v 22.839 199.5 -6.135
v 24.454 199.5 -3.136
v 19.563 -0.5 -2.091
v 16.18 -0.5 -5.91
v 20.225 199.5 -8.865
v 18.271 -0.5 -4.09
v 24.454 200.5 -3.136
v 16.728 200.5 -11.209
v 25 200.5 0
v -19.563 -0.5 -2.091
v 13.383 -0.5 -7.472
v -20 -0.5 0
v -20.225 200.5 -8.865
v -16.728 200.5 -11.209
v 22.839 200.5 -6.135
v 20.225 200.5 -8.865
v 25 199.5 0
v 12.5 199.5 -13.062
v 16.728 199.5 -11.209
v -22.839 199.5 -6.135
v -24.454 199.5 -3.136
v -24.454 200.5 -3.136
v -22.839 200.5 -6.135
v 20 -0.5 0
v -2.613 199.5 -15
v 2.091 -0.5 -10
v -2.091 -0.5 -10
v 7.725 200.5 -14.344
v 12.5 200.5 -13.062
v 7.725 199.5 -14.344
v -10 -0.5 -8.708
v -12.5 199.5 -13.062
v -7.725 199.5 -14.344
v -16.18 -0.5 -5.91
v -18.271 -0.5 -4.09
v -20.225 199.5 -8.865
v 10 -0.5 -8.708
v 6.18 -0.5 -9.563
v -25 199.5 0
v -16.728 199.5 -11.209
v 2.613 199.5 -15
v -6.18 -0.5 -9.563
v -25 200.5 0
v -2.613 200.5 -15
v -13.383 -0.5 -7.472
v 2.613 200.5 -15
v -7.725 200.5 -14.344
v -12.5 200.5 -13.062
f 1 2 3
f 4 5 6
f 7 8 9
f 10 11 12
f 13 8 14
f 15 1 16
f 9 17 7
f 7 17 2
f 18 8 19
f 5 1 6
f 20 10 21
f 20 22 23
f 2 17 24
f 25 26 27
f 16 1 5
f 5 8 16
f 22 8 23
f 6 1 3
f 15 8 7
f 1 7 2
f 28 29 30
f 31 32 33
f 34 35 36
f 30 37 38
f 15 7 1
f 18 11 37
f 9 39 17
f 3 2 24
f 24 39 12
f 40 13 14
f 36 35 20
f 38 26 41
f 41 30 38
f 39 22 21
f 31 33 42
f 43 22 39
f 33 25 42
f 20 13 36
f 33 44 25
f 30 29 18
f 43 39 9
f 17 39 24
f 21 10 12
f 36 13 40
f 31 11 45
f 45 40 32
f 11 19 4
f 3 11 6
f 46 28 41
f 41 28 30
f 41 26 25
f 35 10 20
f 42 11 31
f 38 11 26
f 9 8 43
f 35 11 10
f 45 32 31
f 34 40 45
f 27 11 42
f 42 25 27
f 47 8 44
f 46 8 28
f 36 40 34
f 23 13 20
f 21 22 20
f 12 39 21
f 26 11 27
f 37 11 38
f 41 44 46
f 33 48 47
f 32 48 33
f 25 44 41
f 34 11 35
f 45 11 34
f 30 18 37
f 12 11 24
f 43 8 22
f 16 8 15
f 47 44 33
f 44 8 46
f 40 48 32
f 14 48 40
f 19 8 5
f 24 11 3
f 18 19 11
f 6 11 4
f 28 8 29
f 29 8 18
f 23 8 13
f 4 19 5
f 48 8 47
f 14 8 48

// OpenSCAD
hull () {
  translate ([0, 0, 0]) {
    resize ([40, 1, 10]){
      rotate (a=-90.0, v=[1, 0, 0]) {
        difference () {
          cylinder (h=5, r=20, center=true);
          translate ([0, -20, 0]) {
            cube ([40, 40, 20], center=true);
          }
        }
      }
    }
  }
  translate ([0, 200, 0]) {
    resize ([50, 1, 15]){
      rotate (a=-90.0, v=[1, 0, 0]) {
        difference () {
          cylinder (h=5, r=20, center=true);
          translate ([0, -20, 0]) {
            cube ([40, 40, 20], center=true);
          }
        }
      }
    }
  }
}
